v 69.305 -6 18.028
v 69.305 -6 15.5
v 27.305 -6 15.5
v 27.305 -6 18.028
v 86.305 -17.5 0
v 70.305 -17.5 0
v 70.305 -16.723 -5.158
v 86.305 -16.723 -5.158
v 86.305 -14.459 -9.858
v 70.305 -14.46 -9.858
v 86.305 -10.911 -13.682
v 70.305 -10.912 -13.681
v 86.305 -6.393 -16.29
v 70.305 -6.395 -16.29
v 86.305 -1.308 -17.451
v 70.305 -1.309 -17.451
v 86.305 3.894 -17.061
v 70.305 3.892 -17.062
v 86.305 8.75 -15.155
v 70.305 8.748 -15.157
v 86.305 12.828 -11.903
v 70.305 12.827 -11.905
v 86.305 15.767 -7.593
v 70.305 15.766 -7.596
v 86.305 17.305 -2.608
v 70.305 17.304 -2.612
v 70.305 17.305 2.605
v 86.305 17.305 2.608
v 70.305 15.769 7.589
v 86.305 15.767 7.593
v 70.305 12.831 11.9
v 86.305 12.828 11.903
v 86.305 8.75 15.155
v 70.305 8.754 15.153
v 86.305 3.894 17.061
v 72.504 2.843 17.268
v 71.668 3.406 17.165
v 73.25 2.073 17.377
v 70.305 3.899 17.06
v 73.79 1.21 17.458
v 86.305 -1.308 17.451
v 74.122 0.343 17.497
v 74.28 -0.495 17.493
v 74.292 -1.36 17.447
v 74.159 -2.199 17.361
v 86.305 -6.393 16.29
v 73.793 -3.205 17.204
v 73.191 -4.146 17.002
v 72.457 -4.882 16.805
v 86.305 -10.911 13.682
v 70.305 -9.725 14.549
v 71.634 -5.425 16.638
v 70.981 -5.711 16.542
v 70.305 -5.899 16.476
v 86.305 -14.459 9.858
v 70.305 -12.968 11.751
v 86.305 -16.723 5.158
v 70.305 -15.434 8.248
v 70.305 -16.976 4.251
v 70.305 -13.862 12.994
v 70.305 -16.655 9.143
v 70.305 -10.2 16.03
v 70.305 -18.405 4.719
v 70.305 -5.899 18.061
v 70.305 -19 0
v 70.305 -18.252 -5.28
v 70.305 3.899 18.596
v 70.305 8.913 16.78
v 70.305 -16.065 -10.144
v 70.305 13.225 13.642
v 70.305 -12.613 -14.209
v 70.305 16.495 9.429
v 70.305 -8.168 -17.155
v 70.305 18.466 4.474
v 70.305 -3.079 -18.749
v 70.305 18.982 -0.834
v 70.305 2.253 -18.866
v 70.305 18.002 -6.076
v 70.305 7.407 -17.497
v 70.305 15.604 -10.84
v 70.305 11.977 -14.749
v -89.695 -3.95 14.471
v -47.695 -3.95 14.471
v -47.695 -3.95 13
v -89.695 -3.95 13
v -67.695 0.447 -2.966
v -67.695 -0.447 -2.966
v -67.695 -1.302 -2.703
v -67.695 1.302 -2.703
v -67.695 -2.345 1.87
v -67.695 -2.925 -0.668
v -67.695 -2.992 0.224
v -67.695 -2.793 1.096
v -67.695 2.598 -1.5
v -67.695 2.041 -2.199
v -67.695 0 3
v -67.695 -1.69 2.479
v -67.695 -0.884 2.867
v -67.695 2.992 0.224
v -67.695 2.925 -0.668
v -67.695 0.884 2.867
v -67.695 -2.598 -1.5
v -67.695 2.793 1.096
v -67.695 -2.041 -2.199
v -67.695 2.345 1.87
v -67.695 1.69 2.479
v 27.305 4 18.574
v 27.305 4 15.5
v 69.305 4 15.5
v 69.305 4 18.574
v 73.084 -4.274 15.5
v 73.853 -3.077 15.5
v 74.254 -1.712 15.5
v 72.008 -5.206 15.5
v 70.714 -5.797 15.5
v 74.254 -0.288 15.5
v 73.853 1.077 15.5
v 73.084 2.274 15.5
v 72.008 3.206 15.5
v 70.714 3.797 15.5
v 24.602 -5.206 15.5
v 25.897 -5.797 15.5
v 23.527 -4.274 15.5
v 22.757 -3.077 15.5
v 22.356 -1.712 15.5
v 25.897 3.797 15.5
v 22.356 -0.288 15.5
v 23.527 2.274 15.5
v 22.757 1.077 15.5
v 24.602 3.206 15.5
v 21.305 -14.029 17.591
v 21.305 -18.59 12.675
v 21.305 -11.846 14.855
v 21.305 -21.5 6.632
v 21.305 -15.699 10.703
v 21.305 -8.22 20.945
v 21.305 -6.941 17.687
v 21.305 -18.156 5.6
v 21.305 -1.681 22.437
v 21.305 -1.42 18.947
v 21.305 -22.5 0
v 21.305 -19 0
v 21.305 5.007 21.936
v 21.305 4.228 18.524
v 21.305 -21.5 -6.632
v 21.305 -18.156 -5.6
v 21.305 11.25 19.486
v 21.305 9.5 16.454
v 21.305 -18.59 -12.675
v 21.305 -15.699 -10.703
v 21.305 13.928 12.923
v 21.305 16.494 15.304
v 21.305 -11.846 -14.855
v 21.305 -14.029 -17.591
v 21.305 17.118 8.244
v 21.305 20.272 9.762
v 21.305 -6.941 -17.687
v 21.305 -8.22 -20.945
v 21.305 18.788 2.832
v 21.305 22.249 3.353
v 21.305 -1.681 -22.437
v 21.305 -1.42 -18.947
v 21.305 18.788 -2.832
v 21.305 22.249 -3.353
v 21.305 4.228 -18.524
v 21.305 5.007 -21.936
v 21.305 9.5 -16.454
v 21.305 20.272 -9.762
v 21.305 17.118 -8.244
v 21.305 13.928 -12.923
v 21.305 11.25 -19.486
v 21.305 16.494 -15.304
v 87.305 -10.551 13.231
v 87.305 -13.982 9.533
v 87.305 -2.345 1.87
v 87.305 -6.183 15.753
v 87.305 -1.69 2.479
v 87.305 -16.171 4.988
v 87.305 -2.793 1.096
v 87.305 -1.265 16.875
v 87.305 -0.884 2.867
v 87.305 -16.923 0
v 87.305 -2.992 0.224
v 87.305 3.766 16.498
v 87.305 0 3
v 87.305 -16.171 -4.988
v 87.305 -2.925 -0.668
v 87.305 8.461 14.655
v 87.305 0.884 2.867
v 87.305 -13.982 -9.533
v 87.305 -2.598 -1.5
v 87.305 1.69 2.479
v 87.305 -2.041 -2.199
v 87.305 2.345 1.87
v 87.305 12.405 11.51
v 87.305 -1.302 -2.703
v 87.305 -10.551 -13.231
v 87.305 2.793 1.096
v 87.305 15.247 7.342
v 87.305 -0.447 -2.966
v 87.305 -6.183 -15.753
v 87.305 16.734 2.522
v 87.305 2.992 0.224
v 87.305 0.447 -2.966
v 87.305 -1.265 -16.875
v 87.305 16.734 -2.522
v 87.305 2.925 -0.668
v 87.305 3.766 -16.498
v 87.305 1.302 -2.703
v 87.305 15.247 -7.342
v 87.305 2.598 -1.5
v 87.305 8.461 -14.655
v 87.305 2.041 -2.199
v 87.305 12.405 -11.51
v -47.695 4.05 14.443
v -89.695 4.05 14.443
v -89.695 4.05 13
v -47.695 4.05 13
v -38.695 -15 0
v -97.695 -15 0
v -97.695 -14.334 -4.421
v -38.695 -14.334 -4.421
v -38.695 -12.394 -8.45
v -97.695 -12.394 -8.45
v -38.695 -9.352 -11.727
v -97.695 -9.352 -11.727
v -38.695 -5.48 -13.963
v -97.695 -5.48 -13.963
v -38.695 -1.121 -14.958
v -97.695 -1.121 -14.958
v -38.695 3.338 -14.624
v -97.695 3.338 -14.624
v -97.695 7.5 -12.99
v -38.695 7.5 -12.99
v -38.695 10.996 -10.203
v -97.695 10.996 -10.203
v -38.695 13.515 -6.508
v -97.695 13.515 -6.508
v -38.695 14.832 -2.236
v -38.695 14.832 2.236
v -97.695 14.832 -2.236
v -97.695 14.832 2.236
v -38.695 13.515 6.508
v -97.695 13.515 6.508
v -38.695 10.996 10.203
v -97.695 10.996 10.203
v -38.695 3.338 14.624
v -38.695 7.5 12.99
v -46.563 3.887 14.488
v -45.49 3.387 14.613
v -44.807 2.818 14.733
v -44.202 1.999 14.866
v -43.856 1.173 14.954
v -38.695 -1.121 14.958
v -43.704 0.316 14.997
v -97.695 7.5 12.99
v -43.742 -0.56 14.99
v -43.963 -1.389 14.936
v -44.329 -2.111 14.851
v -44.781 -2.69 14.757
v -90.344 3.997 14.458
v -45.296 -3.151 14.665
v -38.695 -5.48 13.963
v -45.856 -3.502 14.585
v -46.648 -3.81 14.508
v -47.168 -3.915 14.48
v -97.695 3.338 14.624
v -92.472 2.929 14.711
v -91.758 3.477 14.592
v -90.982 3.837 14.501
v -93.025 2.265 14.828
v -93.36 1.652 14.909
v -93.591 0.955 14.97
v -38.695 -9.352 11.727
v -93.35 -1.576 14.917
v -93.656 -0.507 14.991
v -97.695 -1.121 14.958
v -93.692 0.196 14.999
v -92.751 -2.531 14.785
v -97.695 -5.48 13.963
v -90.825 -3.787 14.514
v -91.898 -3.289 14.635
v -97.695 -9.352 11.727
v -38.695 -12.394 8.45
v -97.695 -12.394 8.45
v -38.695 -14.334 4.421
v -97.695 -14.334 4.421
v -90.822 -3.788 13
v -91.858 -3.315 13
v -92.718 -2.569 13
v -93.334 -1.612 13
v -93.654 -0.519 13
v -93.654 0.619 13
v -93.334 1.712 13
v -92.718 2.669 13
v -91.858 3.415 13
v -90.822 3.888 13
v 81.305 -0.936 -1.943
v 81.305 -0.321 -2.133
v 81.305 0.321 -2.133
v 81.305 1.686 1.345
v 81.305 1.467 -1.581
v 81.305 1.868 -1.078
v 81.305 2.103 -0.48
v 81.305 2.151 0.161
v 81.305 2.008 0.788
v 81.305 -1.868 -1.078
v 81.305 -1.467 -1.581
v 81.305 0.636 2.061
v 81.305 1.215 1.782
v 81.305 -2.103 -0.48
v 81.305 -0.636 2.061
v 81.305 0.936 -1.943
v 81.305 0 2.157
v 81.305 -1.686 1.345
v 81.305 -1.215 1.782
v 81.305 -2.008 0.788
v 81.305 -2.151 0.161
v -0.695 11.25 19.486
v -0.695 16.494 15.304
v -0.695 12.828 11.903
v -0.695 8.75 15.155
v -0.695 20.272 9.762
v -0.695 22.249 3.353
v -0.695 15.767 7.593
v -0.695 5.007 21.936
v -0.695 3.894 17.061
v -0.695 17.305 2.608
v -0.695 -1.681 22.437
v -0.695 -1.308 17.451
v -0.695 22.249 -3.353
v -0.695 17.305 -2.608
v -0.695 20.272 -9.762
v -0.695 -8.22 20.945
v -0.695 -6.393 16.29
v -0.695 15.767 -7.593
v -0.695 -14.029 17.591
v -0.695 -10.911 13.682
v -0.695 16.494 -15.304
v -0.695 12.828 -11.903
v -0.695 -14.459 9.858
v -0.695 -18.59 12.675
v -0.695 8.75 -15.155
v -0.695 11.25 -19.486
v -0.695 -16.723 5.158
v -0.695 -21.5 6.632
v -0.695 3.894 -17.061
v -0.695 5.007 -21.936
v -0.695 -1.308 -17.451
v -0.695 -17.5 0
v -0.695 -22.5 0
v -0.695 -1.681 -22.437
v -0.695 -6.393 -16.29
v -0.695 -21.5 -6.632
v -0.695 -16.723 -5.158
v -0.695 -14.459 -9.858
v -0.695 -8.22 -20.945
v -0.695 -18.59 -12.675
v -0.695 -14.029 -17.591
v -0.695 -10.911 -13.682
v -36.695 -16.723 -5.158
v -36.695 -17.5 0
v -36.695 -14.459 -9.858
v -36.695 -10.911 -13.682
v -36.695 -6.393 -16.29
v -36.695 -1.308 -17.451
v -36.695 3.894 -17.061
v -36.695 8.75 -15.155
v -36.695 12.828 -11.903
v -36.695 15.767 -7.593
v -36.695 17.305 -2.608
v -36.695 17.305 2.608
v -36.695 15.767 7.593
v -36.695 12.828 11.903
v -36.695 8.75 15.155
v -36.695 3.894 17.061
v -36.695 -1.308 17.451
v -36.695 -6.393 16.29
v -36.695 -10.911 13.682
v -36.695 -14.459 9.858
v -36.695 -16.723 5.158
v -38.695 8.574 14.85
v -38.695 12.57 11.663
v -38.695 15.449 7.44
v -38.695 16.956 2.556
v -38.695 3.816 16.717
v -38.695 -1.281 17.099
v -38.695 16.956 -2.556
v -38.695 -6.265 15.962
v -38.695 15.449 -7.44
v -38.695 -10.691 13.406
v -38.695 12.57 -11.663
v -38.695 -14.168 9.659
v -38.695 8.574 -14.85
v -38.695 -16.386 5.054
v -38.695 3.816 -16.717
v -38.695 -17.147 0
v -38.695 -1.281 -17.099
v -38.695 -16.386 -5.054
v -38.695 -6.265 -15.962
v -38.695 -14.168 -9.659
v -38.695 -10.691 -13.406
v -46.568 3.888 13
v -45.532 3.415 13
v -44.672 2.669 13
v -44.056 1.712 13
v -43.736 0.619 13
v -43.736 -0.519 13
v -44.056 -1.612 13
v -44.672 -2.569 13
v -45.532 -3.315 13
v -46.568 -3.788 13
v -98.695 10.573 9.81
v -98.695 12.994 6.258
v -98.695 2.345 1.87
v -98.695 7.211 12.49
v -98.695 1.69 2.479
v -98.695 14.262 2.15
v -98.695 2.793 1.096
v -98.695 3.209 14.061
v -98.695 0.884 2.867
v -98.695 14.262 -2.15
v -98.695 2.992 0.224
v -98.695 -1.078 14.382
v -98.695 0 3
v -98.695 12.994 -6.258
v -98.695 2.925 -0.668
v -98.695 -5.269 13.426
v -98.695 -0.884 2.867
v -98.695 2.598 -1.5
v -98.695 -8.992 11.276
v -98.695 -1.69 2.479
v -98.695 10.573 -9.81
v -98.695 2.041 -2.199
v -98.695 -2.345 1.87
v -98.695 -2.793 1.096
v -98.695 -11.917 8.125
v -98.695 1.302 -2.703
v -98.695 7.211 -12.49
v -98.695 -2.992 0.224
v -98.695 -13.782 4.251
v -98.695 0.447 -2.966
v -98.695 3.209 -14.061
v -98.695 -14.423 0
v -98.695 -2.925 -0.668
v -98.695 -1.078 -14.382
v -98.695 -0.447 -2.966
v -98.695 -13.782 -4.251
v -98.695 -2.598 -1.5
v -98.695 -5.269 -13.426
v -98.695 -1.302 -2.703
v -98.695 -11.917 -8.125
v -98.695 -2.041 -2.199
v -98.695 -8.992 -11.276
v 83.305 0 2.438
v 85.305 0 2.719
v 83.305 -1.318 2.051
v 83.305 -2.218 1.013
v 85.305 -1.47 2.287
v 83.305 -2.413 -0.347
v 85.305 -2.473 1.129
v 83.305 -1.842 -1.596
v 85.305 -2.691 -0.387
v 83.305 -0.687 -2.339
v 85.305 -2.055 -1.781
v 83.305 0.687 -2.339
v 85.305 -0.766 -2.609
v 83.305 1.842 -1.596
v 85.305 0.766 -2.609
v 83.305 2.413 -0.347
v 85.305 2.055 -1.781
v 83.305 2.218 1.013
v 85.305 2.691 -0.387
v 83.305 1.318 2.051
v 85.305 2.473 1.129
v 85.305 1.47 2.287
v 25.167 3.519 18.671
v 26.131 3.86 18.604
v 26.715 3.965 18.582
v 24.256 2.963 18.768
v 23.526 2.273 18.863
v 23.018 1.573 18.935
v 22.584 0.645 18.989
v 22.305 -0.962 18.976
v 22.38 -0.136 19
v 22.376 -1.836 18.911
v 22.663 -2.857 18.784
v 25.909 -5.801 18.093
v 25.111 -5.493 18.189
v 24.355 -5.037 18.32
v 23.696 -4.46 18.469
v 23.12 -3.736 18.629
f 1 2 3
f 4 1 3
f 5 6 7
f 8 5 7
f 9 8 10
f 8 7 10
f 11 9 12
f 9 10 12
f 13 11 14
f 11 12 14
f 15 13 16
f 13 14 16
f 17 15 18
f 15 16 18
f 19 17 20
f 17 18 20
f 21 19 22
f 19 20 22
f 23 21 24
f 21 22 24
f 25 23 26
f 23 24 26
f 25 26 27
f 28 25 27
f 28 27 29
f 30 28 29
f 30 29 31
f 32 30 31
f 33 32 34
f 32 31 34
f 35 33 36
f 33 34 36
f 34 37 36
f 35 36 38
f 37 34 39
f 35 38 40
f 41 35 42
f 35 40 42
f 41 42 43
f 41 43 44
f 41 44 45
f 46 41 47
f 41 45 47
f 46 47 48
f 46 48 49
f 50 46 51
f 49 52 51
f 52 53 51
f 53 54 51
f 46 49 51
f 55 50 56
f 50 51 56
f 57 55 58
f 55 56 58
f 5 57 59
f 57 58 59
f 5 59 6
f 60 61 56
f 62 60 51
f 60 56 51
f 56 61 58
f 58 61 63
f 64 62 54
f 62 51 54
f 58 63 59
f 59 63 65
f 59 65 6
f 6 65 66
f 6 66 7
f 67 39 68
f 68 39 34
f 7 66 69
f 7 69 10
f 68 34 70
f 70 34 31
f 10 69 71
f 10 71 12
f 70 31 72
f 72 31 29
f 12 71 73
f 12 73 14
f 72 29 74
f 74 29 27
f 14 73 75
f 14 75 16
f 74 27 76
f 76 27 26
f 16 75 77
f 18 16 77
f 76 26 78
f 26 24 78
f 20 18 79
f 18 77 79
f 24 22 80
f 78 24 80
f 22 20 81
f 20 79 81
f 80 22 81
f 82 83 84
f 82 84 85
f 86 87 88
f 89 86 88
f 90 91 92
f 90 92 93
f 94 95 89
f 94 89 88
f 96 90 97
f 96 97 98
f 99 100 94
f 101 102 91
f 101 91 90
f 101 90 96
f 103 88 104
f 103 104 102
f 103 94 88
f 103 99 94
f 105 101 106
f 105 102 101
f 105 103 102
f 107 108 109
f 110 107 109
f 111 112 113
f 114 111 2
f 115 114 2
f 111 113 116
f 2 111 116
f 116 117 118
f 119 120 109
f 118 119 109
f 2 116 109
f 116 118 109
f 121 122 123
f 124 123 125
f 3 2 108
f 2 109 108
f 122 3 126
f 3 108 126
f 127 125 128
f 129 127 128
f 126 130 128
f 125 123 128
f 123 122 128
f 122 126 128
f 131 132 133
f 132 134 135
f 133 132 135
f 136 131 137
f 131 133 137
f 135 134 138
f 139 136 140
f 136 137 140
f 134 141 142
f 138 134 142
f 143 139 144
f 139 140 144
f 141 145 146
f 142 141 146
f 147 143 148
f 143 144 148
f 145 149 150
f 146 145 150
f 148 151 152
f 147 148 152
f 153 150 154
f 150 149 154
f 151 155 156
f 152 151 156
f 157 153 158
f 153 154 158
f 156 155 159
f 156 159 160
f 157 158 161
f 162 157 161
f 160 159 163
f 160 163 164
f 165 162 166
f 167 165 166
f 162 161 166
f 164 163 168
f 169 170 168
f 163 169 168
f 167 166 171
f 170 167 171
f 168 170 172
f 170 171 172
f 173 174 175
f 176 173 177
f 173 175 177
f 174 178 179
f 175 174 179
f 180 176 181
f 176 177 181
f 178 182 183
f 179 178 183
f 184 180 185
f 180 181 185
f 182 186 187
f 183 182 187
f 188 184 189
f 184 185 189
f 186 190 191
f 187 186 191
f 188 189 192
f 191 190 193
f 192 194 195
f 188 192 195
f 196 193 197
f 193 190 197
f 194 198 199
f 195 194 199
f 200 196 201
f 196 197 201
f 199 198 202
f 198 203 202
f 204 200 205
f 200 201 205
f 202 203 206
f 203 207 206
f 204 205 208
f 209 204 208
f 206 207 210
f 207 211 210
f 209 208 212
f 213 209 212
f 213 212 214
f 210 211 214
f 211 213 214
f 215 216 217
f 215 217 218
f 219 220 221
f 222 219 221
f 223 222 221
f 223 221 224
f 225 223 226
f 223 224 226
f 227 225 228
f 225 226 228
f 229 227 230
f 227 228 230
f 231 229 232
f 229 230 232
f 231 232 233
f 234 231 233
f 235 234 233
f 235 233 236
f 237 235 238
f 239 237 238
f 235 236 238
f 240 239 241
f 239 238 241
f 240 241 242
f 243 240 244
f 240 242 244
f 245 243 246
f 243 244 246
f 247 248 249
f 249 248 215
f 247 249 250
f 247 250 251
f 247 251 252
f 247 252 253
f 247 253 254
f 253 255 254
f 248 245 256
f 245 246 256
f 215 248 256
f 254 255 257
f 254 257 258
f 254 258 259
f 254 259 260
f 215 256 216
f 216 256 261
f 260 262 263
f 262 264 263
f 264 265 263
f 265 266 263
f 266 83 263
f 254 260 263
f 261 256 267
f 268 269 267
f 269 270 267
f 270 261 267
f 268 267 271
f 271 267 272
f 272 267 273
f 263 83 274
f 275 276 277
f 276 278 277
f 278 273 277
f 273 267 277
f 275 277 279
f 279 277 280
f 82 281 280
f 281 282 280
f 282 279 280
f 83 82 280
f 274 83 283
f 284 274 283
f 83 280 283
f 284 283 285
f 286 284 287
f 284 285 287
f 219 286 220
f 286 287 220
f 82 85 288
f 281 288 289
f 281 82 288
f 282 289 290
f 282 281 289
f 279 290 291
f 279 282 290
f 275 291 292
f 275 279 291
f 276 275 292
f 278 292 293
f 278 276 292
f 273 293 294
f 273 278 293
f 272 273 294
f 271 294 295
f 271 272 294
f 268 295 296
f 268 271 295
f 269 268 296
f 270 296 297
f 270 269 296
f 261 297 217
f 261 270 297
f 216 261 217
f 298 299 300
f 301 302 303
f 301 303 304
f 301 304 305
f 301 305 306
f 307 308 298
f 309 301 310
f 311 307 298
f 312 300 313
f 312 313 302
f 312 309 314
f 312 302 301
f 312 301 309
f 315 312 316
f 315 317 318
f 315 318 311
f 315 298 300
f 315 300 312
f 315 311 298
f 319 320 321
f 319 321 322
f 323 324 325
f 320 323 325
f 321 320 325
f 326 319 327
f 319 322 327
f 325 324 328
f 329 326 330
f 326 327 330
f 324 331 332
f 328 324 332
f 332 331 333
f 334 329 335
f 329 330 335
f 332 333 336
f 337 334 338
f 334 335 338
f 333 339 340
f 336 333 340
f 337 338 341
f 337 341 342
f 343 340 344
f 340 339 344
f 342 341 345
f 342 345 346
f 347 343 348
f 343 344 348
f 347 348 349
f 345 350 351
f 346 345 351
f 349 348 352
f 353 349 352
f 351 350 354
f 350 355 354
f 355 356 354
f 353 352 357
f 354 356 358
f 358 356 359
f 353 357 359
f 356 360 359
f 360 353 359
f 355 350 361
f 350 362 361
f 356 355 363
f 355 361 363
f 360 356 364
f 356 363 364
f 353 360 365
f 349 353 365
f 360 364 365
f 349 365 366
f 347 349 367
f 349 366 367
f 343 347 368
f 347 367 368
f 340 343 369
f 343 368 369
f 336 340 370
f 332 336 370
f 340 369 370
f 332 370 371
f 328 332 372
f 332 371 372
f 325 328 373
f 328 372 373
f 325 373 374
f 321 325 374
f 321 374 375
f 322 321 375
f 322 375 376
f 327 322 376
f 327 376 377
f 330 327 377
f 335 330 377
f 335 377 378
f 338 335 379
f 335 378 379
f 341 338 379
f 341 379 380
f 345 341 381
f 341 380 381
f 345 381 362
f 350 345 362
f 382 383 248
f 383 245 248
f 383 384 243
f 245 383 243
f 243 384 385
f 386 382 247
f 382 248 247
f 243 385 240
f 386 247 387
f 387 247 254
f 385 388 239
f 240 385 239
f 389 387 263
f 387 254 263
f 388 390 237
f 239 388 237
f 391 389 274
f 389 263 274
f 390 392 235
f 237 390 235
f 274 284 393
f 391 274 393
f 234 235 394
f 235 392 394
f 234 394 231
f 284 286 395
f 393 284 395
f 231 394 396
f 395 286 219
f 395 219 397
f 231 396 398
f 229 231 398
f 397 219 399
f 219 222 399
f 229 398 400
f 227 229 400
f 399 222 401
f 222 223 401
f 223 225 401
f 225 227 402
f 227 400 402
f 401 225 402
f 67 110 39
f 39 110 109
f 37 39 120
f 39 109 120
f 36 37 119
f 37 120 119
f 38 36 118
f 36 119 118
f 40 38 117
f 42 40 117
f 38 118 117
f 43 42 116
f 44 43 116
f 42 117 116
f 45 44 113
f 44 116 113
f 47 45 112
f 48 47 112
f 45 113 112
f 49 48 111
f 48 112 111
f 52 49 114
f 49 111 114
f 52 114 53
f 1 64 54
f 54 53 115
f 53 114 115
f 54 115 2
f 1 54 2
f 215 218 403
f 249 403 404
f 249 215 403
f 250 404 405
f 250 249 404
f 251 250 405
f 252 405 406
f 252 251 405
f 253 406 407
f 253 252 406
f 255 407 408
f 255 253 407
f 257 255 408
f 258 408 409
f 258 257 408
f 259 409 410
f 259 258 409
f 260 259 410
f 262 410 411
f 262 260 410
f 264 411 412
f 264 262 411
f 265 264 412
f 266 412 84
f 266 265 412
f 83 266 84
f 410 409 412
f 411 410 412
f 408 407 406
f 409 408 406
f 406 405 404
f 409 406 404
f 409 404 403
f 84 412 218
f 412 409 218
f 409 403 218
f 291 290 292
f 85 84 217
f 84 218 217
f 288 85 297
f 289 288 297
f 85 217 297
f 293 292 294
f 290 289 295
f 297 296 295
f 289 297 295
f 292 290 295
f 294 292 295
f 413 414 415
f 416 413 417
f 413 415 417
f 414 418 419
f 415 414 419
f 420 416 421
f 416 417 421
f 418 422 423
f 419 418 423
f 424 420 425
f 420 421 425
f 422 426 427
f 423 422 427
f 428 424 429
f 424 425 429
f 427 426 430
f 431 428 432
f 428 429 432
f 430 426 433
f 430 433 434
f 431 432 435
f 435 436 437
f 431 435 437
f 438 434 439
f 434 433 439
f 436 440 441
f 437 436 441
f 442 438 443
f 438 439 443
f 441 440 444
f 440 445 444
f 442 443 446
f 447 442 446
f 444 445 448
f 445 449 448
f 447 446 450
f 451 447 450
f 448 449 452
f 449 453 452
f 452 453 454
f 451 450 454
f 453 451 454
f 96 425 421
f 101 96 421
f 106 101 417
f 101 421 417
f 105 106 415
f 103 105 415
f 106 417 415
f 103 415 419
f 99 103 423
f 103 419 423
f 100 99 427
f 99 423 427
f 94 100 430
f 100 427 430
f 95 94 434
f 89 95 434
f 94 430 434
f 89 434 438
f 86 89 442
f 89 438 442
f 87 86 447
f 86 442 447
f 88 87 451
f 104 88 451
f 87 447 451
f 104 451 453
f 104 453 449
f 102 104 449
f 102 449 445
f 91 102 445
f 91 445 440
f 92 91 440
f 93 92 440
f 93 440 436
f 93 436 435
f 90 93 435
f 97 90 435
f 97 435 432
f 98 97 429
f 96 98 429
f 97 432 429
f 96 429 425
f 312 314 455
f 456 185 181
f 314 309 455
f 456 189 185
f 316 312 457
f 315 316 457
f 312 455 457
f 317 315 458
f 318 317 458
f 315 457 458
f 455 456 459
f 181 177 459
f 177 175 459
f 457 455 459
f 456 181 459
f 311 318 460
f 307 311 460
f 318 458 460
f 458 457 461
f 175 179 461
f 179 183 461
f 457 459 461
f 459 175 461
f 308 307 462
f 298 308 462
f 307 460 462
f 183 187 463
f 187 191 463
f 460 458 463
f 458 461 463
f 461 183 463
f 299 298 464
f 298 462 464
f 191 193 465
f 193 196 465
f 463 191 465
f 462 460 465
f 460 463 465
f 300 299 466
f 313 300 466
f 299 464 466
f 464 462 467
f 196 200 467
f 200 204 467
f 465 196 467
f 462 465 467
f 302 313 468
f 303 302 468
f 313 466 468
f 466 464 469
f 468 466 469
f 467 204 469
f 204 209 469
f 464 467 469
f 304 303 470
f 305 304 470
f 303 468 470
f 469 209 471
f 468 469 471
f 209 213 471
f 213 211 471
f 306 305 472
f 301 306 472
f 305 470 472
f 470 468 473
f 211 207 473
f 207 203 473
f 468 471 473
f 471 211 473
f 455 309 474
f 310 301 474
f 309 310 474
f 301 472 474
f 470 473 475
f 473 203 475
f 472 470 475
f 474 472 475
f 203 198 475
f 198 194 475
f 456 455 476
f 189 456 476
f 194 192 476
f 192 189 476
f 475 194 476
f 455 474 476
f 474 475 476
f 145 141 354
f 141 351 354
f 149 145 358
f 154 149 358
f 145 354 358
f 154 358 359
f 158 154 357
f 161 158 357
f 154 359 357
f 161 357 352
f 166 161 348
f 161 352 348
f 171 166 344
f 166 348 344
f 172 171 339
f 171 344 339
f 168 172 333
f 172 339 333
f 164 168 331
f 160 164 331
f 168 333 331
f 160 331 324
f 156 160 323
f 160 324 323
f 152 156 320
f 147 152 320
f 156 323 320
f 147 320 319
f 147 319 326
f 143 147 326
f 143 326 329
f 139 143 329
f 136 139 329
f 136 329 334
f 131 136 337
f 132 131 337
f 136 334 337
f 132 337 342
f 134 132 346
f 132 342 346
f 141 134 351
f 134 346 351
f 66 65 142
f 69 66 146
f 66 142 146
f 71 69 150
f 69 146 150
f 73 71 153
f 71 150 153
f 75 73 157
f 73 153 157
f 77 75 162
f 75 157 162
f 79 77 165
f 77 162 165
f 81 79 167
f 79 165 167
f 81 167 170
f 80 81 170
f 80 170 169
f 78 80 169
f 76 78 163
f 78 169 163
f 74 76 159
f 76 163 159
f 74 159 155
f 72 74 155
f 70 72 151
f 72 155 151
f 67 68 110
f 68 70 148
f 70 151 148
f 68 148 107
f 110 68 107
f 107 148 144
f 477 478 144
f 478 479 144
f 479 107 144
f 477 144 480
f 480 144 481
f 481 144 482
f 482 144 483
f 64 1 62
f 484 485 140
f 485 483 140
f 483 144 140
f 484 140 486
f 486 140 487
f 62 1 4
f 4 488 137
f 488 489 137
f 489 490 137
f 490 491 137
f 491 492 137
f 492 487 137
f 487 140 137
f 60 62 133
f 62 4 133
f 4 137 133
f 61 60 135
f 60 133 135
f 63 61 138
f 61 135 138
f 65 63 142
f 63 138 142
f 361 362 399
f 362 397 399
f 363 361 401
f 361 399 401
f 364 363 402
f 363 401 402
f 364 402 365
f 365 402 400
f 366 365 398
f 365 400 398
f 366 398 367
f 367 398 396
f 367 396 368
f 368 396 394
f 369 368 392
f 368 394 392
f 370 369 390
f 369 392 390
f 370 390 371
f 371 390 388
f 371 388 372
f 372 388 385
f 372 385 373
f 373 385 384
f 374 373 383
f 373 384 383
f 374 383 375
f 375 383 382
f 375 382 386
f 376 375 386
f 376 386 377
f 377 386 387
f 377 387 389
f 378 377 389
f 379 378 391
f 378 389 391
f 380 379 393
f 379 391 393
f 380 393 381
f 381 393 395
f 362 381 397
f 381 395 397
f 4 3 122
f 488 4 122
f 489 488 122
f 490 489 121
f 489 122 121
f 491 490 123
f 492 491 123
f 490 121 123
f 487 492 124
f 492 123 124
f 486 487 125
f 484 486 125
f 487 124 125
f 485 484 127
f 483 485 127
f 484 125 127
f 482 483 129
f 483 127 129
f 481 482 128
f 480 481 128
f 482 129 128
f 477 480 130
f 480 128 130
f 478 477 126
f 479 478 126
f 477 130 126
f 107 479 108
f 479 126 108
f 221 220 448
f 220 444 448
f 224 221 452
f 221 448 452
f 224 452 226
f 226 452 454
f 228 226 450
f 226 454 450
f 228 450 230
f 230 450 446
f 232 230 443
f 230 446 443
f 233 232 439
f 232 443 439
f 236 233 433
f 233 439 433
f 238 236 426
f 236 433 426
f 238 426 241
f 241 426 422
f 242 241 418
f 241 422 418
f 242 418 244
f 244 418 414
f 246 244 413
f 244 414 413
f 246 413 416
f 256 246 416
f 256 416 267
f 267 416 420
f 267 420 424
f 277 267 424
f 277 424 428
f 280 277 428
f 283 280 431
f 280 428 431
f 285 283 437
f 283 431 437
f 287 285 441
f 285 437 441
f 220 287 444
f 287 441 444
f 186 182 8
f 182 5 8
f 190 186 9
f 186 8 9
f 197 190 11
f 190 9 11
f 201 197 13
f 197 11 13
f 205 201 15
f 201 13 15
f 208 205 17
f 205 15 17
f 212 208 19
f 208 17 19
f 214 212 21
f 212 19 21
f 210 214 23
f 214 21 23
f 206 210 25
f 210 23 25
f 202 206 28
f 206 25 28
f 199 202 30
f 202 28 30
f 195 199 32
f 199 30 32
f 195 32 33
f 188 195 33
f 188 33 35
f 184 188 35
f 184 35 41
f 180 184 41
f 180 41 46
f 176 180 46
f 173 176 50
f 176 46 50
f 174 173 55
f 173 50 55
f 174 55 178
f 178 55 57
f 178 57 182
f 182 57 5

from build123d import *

# Parameters (mm, degrees)
CUT_EXTRUDE1_START = 15
CUT_EXTRUDE1_DEPTH = 2
CUT_EXTRUDE2_START = 15.5
CUT_EXTRUDE2_DEPTH = 25
SKETCH5_R          = 3
CUT_EXTRUDE3_DEPTH = 31
SKETCH9_R          = 3
CUT_EXTRUDE4_DEPTH = 6
CUT_EXTRUDE4_DRAFT = -8


with BuildPart() as part:
    # Sketch1 → Revolve1 (revolve)
    with BuildSketch(Plane.XY, mode=Mode.PRIVATE) as revolve1_sk:
        Polygon((-98.694744318, 0), (87.305255682, 0), (87.305255682, 16.922649731), (86.305255682, 17.5), (70.305255682, 17.5), (70.305255682, 19), (21.305255682, 19), (21.305255682, 22.5), (-0.694744318, 22.5), (-0.694744318, 17.5), (-36.694744318, 17.5), (-38.694744318, 17.147346039), (-38.694744318, 15), (-97.694744318, 15), (-98.694744318, 14.422649731), align=None)
    revolve(revolve1_sk.sketch.rotate(Axis((-98.694744318, 0, 0), (1, 0, 0)), 180), axis=Axis((-98.694744318, 0, 0), (1, 0, 0)))

    # Sketch2 → Cut-Extrude1 (cut)
    with BuildSketch(Plane.XY.offset(CUT_EXTRUDE1_START)):
        with BuildLine():
            Line((-89.694994324, 4.05), (-47.694994324, 4.05))
            ThreePointArc((-47.694994324, 4.05), (-43.694994324, 0.05), (-47.694994324, -3.95))
            Line((-47.694994324, -3.95), (-89.694994324, -3.95))
            ThreePointArc((-89.694994324, -3.95), (-93.694994324, 0.05), (-89.694994324, 4.05))
        make_face()
    extrude(amount=-CUT_EXTRUDE1_DEPTH, mode=Mode.SUBTRACT)

    # Sketch3 → Cut-Extrude2 (cut)
    with BuildSketch(Plane.XY.offset(CUT_EXTRUDE2_START)):
        with BuildLine():
            Line((27.305255682, 4), (69.305255682, 4))
            ThreePointArc((69.305255682, 4), (74.305255682, -1), (69.305255682, -6))
            Line((69.305255682, -6), (27.305255682, -6))
            ThreePointArc((27.305255682, -6), (22.305255682, -1), (27.305255682, 4))
        make_face()
    extrude(amount=CUT_EXTRUDE2_DEPTH, mode=Mode.SUBTRACT)

    # Sketch5 → Cut-Extrude3 (cut)
    with BuildSketch(Plane.ZY.offset(98.694744318)):
        Circle(SKETCH5_R)
    extrude(amount=-CUT_EXTRUDE3_DEPTH, mode=Mode.SUBTRACT)


with BuildPart() as cut_extrude4_tool:
    # Sketch9 → Cut-Extrude4 (with draft: the straight prism first)
    with BuildSketch(Plane(origin=(87.305255682, 0, 0), x_dir=(0, 0, -1), z_dir=(1, 0, 0))):
        with Locations(Location((0, 0, 0), (0, 0, 180))):
            Circle(SKETCH9_R)
    extrude(amount=-CUT_EXTRUDE4_DEPTH)
    # Cut-Extrude4: the draft: its side faces are tilted about the plane it starts from
    cut_extrude4_sides = [cut_extrude4_tool.faces().sort_by_distance(p)[0] for p in [
        (84.305255682, 0, -3),
    ]]
    draft(cut_extrude4_sides, Plane(origin=(87.305255682, 0, 0), x_dir=(0, 0, -1), z_dir=(1, 0, 0)), CUT_EXTRUDE4_DRAFT)


with BuildPart() as part_1:
    add(part.part)

    # Cut-Extrude4: cut by cut_extrude4_tool
    add(cut_extrude4_tool.part, mode=Mode.SUBTRACT)


solid = part_1.part
